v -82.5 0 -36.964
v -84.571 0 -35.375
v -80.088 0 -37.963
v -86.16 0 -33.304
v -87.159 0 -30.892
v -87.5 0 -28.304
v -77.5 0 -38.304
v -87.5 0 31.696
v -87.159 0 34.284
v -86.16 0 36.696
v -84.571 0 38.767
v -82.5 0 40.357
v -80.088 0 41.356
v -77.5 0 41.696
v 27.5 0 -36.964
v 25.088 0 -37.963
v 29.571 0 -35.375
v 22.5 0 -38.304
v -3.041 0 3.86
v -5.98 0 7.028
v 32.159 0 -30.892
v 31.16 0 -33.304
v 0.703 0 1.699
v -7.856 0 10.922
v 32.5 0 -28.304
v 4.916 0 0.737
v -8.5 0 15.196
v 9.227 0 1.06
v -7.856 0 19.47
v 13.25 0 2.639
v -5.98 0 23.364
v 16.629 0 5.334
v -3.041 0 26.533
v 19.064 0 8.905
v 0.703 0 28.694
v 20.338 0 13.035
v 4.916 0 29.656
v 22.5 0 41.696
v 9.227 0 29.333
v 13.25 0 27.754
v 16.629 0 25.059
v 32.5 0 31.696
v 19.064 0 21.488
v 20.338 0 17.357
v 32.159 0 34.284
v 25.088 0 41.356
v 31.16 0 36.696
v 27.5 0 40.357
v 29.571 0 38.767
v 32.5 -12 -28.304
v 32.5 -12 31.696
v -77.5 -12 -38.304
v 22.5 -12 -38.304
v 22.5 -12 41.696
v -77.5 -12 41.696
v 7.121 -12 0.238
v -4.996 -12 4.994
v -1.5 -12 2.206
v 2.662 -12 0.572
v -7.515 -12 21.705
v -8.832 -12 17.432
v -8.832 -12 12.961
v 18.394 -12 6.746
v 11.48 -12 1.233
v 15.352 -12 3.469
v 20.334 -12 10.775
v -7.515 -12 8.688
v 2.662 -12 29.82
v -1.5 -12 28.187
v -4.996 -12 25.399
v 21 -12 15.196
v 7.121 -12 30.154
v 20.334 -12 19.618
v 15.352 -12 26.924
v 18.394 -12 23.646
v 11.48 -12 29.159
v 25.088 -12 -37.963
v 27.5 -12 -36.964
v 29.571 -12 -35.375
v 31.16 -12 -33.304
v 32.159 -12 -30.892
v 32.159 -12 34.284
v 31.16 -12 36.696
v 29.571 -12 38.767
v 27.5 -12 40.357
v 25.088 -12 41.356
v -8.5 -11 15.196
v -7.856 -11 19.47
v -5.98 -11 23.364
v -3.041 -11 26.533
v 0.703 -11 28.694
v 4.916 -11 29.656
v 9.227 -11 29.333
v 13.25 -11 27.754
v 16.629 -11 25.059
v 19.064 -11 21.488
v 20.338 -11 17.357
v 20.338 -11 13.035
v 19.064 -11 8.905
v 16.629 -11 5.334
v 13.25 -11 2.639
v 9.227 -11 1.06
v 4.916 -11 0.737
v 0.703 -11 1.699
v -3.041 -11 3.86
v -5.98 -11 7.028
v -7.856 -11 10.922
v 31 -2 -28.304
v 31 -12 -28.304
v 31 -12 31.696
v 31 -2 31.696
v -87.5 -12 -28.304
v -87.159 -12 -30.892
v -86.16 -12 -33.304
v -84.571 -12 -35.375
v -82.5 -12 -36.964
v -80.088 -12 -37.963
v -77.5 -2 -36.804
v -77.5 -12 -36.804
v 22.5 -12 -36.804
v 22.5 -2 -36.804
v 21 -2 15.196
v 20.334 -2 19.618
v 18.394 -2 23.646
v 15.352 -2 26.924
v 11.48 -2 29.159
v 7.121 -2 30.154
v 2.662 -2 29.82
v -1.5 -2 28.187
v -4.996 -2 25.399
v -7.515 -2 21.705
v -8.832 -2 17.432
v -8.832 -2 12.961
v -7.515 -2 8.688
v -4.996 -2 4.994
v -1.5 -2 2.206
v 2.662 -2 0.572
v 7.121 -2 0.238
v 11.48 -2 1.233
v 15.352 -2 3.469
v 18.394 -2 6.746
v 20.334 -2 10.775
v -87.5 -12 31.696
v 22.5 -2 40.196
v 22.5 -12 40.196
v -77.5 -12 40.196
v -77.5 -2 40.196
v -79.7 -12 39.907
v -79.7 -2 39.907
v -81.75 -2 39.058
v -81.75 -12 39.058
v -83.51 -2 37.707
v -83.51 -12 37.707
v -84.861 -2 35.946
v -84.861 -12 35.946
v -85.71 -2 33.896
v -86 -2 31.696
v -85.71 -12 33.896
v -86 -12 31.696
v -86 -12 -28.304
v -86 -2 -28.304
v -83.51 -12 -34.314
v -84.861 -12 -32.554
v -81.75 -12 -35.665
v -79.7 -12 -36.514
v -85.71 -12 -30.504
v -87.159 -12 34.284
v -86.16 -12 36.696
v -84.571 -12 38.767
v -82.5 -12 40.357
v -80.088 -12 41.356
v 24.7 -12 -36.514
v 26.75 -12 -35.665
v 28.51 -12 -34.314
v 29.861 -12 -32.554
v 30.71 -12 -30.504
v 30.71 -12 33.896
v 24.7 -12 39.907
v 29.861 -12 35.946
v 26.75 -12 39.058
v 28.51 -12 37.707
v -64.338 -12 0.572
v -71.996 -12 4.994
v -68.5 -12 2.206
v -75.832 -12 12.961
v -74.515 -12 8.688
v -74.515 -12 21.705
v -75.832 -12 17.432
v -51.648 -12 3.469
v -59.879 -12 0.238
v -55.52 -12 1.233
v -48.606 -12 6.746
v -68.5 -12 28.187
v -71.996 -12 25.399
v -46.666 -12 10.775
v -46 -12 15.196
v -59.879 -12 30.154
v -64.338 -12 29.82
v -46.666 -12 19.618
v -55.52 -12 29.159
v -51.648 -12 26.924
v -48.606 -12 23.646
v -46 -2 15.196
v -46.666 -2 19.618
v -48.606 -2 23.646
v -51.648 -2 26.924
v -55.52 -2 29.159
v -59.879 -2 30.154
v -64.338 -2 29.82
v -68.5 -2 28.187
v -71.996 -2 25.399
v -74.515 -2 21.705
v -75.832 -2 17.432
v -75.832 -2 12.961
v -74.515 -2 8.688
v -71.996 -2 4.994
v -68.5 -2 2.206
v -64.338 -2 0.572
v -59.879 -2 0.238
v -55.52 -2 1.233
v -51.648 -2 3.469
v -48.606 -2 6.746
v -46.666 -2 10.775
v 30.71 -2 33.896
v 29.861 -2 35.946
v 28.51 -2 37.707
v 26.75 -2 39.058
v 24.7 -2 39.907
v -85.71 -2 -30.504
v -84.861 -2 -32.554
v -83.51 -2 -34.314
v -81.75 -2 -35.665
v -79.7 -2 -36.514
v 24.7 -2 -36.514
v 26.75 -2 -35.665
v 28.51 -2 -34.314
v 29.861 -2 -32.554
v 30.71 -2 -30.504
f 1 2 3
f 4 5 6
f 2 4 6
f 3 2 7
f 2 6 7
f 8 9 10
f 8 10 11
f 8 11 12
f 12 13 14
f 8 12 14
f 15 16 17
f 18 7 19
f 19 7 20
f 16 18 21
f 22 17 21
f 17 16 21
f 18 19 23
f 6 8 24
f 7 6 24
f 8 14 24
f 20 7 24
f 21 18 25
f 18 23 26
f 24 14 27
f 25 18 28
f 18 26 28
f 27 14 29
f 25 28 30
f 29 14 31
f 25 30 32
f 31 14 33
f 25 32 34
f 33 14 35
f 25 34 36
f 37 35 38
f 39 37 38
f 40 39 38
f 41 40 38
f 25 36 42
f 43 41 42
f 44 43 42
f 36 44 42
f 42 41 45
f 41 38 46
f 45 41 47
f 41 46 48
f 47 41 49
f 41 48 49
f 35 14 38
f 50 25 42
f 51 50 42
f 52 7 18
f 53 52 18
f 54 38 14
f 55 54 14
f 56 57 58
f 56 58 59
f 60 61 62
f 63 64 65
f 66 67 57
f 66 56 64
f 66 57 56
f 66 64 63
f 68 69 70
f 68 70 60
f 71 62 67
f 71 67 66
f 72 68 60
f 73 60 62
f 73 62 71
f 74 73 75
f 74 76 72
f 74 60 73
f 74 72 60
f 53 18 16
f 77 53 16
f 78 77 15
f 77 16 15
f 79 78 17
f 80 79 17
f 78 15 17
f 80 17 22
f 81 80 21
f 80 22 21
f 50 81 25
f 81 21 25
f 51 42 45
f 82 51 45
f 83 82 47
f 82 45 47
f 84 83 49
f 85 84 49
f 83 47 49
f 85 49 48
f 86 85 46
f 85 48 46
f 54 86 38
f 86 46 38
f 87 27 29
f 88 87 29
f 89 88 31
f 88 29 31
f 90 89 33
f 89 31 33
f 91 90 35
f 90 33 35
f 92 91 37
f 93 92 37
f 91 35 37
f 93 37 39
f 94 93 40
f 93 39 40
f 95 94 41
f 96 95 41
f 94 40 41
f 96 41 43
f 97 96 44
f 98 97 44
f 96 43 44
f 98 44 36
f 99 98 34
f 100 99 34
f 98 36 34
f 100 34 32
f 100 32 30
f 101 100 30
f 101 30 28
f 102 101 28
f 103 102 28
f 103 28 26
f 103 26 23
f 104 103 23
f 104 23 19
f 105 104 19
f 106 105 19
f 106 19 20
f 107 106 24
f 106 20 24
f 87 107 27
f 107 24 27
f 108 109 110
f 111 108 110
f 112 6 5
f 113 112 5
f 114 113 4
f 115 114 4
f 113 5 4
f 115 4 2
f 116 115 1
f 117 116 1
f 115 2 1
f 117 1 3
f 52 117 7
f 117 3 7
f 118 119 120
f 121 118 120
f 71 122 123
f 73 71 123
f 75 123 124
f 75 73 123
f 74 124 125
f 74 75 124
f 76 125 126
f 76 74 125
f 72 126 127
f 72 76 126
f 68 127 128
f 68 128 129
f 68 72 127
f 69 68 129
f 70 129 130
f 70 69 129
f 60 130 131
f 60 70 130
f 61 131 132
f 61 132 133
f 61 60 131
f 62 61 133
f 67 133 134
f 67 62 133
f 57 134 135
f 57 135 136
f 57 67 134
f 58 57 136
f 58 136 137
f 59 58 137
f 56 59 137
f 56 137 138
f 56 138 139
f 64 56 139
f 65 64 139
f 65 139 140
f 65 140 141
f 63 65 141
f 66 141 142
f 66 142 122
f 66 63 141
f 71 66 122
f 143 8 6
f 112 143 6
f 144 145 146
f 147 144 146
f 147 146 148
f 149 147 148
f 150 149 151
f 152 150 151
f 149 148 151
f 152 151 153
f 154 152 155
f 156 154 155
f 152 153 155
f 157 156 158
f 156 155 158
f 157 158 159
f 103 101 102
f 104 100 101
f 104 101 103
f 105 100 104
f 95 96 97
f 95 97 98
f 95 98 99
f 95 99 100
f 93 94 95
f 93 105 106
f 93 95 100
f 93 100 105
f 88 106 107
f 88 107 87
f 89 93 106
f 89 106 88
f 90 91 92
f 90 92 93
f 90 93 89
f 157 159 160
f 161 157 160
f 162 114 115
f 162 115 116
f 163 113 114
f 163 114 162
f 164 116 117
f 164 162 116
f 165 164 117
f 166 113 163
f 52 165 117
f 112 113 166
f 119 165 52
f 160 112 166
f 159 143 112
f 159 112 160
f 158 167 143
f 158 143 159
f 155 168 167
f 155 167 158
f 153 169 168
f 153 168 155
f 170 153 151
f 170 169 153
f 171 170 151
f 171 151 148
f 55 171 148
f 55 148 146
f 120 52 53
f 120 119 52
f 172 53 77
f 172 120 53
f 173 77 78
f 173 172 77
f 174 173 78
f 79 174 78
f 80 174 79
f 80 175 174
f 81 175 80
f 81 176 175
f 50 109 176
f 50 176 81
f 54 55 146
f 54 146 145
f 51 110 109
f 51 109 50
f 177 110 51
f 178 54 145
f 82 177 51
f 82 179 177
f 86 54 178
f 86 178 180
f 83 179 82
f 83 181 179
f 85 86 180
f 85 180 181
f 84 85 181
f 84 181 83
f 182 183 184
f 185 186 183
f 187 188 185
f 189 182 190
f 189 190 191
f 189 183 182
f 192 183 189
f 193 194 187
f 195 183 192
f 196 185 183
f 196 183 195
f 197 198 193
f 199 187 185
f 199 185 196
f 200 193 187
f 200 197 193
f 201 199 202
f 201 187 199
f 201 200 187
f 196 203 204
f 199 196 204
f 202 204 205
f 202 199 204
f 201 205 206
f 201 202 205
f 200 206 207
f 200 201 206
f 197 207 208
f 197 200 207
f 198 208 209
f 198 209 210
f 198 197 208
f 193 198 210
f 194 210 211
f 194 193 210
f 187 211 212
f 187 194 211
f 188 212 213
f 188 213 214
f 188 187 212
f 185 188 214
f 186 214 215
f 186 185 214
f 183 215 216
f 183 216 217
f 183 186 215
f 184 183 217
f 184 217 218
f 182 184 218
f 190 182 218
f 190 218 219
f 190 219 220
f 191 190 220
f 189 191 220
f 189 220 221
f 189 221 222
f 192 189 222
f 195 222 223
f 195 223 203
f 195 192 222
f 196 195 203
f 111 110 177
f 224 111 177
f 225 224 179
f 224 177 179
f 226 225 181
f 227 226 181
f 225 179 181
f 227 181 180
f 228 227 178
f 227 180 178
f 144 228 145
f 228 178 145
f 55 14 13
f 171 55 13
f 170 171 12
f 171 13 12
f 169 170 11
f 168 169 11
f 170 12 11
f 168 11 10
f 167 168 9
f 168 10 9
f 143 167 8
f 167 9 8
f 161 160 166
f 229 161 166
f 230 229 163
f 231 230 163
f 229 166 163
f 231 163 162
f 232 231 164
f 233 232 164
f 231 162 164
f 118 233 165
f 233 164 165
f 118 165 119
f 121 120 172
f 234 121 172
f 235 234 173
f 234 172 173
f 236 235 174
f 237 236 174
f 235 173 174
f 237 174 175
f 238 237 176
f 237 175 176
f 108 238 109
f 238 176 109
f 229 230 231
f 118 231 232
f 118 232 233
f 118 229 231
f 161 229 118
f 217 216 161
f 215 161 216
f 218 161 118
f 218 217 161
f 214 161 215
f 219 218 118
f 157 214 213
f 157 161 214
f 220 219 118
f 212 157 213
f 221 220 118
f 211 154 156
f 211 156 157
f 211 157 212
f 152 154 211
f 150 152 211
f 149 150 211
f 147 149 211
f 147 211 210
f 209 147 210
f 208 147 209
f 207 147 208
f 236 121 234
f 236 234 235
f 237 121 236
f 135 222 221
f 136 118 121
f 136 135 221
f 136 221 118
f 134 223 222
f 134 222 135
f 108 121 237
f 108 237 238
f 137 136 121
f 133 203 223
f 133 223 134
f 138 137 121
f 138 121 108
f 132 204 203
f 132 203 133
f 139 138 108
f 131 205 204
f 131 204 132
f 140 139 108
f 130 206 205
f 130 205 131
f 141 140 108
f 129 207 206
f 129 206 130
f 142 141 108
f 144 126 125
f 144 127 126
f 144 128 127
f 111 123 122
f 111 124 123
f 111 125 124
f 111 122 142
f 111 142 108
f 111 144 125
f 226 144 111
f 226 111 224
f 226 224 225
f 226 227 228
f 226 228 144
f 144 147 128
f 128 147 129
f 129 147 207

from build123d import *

# Parameters (mm, degrees)
F1_DEPTH = 12
F2_R     = 15
F3_DEPTH = 10
F4_R     = 14.5
F5_DEPTH = 11


with BuildPart() as f1:
    # F0 (on Front) → F1 (new body)
    with BuildSketch(Plane.XZ):
        with BuildLine():
            ThreePointArc((-87.5, -28.3037), (-84.571068, -35.374768), (-77.5, -38.3037))
            Line((-77.5, -38.3037), (22.5, -38.3037))
            ThreePointArc((22.5, -38.3037), (29.571068, -35.374768), (32.5, -28.3037))
            Line((32.5, -28.3037), (32.5, 31.6963))
            ThreePointArc((32.5, 31.6963), (29.571068, 38.767368), (22.5, 41.6963))
            Line((22.5, 41.6963), (-77.5, 41.6963))
            ThreePointArc((-77.5, 41.6963), (-84.571068, 38.767368), (-87.5, 31.6963))
            Line((-87.5, 31.6963), (-87.5, -28.3037))
        make_face()
    extrude(amount=F1_DEPTH)

    # F2 (on face) → F3 (cut)
    with BuildSketch(Plane.XZ.offset(12)):
        with BuildLine():
            Line((31, -28.3037), (31, 31.6963))
            ThreePointArc((31, 31.6963), (28.510408, 37.706708), (22.5, 40.1963))
            Line((22.5, 40.1963), (-77.5, 40.1963))
            ThreePointArc((-77.5, 40.1963), (-83.510408, 37.706708), (-86, 31.6963))
            Line((-86, 31.6963), (-86, -28.3037))
            ThreePointArc((-86, -28.3037), (-83.510408, -34.314108), (-77.5, -36.8037))
            Line((-77.5, -36.8037), (22.5, -36.8037))
            ThreePointArc((22.5, -36.8037), (28.510408, -34.314108), (31, -28.3037))
        make_face()
        with Locations((-61, 15.1963)):
            Circle(F2_R, mode=Mode.SUBTRACT)
        with Locations((6, 15.1963)):
            Circle(F2_R, mode=Mode.SUBTRACT)
    extrude(amount=-F3_DEPTH, mode=Mode.SUBTRACT)

    # F4 (on face) → F5 (cut)
    with BuildSketch(Plane(origin=(0, 0, 0), x_dir=(-1, 0, 0), z_dir=(0, 1, 0))):
        with Locations((-6, 15.1963)):
            Circle(F4_R)
    extrude(amount=-F5_DEPTH, mode=Mode.SUBTRACT)


solid = f1.part
